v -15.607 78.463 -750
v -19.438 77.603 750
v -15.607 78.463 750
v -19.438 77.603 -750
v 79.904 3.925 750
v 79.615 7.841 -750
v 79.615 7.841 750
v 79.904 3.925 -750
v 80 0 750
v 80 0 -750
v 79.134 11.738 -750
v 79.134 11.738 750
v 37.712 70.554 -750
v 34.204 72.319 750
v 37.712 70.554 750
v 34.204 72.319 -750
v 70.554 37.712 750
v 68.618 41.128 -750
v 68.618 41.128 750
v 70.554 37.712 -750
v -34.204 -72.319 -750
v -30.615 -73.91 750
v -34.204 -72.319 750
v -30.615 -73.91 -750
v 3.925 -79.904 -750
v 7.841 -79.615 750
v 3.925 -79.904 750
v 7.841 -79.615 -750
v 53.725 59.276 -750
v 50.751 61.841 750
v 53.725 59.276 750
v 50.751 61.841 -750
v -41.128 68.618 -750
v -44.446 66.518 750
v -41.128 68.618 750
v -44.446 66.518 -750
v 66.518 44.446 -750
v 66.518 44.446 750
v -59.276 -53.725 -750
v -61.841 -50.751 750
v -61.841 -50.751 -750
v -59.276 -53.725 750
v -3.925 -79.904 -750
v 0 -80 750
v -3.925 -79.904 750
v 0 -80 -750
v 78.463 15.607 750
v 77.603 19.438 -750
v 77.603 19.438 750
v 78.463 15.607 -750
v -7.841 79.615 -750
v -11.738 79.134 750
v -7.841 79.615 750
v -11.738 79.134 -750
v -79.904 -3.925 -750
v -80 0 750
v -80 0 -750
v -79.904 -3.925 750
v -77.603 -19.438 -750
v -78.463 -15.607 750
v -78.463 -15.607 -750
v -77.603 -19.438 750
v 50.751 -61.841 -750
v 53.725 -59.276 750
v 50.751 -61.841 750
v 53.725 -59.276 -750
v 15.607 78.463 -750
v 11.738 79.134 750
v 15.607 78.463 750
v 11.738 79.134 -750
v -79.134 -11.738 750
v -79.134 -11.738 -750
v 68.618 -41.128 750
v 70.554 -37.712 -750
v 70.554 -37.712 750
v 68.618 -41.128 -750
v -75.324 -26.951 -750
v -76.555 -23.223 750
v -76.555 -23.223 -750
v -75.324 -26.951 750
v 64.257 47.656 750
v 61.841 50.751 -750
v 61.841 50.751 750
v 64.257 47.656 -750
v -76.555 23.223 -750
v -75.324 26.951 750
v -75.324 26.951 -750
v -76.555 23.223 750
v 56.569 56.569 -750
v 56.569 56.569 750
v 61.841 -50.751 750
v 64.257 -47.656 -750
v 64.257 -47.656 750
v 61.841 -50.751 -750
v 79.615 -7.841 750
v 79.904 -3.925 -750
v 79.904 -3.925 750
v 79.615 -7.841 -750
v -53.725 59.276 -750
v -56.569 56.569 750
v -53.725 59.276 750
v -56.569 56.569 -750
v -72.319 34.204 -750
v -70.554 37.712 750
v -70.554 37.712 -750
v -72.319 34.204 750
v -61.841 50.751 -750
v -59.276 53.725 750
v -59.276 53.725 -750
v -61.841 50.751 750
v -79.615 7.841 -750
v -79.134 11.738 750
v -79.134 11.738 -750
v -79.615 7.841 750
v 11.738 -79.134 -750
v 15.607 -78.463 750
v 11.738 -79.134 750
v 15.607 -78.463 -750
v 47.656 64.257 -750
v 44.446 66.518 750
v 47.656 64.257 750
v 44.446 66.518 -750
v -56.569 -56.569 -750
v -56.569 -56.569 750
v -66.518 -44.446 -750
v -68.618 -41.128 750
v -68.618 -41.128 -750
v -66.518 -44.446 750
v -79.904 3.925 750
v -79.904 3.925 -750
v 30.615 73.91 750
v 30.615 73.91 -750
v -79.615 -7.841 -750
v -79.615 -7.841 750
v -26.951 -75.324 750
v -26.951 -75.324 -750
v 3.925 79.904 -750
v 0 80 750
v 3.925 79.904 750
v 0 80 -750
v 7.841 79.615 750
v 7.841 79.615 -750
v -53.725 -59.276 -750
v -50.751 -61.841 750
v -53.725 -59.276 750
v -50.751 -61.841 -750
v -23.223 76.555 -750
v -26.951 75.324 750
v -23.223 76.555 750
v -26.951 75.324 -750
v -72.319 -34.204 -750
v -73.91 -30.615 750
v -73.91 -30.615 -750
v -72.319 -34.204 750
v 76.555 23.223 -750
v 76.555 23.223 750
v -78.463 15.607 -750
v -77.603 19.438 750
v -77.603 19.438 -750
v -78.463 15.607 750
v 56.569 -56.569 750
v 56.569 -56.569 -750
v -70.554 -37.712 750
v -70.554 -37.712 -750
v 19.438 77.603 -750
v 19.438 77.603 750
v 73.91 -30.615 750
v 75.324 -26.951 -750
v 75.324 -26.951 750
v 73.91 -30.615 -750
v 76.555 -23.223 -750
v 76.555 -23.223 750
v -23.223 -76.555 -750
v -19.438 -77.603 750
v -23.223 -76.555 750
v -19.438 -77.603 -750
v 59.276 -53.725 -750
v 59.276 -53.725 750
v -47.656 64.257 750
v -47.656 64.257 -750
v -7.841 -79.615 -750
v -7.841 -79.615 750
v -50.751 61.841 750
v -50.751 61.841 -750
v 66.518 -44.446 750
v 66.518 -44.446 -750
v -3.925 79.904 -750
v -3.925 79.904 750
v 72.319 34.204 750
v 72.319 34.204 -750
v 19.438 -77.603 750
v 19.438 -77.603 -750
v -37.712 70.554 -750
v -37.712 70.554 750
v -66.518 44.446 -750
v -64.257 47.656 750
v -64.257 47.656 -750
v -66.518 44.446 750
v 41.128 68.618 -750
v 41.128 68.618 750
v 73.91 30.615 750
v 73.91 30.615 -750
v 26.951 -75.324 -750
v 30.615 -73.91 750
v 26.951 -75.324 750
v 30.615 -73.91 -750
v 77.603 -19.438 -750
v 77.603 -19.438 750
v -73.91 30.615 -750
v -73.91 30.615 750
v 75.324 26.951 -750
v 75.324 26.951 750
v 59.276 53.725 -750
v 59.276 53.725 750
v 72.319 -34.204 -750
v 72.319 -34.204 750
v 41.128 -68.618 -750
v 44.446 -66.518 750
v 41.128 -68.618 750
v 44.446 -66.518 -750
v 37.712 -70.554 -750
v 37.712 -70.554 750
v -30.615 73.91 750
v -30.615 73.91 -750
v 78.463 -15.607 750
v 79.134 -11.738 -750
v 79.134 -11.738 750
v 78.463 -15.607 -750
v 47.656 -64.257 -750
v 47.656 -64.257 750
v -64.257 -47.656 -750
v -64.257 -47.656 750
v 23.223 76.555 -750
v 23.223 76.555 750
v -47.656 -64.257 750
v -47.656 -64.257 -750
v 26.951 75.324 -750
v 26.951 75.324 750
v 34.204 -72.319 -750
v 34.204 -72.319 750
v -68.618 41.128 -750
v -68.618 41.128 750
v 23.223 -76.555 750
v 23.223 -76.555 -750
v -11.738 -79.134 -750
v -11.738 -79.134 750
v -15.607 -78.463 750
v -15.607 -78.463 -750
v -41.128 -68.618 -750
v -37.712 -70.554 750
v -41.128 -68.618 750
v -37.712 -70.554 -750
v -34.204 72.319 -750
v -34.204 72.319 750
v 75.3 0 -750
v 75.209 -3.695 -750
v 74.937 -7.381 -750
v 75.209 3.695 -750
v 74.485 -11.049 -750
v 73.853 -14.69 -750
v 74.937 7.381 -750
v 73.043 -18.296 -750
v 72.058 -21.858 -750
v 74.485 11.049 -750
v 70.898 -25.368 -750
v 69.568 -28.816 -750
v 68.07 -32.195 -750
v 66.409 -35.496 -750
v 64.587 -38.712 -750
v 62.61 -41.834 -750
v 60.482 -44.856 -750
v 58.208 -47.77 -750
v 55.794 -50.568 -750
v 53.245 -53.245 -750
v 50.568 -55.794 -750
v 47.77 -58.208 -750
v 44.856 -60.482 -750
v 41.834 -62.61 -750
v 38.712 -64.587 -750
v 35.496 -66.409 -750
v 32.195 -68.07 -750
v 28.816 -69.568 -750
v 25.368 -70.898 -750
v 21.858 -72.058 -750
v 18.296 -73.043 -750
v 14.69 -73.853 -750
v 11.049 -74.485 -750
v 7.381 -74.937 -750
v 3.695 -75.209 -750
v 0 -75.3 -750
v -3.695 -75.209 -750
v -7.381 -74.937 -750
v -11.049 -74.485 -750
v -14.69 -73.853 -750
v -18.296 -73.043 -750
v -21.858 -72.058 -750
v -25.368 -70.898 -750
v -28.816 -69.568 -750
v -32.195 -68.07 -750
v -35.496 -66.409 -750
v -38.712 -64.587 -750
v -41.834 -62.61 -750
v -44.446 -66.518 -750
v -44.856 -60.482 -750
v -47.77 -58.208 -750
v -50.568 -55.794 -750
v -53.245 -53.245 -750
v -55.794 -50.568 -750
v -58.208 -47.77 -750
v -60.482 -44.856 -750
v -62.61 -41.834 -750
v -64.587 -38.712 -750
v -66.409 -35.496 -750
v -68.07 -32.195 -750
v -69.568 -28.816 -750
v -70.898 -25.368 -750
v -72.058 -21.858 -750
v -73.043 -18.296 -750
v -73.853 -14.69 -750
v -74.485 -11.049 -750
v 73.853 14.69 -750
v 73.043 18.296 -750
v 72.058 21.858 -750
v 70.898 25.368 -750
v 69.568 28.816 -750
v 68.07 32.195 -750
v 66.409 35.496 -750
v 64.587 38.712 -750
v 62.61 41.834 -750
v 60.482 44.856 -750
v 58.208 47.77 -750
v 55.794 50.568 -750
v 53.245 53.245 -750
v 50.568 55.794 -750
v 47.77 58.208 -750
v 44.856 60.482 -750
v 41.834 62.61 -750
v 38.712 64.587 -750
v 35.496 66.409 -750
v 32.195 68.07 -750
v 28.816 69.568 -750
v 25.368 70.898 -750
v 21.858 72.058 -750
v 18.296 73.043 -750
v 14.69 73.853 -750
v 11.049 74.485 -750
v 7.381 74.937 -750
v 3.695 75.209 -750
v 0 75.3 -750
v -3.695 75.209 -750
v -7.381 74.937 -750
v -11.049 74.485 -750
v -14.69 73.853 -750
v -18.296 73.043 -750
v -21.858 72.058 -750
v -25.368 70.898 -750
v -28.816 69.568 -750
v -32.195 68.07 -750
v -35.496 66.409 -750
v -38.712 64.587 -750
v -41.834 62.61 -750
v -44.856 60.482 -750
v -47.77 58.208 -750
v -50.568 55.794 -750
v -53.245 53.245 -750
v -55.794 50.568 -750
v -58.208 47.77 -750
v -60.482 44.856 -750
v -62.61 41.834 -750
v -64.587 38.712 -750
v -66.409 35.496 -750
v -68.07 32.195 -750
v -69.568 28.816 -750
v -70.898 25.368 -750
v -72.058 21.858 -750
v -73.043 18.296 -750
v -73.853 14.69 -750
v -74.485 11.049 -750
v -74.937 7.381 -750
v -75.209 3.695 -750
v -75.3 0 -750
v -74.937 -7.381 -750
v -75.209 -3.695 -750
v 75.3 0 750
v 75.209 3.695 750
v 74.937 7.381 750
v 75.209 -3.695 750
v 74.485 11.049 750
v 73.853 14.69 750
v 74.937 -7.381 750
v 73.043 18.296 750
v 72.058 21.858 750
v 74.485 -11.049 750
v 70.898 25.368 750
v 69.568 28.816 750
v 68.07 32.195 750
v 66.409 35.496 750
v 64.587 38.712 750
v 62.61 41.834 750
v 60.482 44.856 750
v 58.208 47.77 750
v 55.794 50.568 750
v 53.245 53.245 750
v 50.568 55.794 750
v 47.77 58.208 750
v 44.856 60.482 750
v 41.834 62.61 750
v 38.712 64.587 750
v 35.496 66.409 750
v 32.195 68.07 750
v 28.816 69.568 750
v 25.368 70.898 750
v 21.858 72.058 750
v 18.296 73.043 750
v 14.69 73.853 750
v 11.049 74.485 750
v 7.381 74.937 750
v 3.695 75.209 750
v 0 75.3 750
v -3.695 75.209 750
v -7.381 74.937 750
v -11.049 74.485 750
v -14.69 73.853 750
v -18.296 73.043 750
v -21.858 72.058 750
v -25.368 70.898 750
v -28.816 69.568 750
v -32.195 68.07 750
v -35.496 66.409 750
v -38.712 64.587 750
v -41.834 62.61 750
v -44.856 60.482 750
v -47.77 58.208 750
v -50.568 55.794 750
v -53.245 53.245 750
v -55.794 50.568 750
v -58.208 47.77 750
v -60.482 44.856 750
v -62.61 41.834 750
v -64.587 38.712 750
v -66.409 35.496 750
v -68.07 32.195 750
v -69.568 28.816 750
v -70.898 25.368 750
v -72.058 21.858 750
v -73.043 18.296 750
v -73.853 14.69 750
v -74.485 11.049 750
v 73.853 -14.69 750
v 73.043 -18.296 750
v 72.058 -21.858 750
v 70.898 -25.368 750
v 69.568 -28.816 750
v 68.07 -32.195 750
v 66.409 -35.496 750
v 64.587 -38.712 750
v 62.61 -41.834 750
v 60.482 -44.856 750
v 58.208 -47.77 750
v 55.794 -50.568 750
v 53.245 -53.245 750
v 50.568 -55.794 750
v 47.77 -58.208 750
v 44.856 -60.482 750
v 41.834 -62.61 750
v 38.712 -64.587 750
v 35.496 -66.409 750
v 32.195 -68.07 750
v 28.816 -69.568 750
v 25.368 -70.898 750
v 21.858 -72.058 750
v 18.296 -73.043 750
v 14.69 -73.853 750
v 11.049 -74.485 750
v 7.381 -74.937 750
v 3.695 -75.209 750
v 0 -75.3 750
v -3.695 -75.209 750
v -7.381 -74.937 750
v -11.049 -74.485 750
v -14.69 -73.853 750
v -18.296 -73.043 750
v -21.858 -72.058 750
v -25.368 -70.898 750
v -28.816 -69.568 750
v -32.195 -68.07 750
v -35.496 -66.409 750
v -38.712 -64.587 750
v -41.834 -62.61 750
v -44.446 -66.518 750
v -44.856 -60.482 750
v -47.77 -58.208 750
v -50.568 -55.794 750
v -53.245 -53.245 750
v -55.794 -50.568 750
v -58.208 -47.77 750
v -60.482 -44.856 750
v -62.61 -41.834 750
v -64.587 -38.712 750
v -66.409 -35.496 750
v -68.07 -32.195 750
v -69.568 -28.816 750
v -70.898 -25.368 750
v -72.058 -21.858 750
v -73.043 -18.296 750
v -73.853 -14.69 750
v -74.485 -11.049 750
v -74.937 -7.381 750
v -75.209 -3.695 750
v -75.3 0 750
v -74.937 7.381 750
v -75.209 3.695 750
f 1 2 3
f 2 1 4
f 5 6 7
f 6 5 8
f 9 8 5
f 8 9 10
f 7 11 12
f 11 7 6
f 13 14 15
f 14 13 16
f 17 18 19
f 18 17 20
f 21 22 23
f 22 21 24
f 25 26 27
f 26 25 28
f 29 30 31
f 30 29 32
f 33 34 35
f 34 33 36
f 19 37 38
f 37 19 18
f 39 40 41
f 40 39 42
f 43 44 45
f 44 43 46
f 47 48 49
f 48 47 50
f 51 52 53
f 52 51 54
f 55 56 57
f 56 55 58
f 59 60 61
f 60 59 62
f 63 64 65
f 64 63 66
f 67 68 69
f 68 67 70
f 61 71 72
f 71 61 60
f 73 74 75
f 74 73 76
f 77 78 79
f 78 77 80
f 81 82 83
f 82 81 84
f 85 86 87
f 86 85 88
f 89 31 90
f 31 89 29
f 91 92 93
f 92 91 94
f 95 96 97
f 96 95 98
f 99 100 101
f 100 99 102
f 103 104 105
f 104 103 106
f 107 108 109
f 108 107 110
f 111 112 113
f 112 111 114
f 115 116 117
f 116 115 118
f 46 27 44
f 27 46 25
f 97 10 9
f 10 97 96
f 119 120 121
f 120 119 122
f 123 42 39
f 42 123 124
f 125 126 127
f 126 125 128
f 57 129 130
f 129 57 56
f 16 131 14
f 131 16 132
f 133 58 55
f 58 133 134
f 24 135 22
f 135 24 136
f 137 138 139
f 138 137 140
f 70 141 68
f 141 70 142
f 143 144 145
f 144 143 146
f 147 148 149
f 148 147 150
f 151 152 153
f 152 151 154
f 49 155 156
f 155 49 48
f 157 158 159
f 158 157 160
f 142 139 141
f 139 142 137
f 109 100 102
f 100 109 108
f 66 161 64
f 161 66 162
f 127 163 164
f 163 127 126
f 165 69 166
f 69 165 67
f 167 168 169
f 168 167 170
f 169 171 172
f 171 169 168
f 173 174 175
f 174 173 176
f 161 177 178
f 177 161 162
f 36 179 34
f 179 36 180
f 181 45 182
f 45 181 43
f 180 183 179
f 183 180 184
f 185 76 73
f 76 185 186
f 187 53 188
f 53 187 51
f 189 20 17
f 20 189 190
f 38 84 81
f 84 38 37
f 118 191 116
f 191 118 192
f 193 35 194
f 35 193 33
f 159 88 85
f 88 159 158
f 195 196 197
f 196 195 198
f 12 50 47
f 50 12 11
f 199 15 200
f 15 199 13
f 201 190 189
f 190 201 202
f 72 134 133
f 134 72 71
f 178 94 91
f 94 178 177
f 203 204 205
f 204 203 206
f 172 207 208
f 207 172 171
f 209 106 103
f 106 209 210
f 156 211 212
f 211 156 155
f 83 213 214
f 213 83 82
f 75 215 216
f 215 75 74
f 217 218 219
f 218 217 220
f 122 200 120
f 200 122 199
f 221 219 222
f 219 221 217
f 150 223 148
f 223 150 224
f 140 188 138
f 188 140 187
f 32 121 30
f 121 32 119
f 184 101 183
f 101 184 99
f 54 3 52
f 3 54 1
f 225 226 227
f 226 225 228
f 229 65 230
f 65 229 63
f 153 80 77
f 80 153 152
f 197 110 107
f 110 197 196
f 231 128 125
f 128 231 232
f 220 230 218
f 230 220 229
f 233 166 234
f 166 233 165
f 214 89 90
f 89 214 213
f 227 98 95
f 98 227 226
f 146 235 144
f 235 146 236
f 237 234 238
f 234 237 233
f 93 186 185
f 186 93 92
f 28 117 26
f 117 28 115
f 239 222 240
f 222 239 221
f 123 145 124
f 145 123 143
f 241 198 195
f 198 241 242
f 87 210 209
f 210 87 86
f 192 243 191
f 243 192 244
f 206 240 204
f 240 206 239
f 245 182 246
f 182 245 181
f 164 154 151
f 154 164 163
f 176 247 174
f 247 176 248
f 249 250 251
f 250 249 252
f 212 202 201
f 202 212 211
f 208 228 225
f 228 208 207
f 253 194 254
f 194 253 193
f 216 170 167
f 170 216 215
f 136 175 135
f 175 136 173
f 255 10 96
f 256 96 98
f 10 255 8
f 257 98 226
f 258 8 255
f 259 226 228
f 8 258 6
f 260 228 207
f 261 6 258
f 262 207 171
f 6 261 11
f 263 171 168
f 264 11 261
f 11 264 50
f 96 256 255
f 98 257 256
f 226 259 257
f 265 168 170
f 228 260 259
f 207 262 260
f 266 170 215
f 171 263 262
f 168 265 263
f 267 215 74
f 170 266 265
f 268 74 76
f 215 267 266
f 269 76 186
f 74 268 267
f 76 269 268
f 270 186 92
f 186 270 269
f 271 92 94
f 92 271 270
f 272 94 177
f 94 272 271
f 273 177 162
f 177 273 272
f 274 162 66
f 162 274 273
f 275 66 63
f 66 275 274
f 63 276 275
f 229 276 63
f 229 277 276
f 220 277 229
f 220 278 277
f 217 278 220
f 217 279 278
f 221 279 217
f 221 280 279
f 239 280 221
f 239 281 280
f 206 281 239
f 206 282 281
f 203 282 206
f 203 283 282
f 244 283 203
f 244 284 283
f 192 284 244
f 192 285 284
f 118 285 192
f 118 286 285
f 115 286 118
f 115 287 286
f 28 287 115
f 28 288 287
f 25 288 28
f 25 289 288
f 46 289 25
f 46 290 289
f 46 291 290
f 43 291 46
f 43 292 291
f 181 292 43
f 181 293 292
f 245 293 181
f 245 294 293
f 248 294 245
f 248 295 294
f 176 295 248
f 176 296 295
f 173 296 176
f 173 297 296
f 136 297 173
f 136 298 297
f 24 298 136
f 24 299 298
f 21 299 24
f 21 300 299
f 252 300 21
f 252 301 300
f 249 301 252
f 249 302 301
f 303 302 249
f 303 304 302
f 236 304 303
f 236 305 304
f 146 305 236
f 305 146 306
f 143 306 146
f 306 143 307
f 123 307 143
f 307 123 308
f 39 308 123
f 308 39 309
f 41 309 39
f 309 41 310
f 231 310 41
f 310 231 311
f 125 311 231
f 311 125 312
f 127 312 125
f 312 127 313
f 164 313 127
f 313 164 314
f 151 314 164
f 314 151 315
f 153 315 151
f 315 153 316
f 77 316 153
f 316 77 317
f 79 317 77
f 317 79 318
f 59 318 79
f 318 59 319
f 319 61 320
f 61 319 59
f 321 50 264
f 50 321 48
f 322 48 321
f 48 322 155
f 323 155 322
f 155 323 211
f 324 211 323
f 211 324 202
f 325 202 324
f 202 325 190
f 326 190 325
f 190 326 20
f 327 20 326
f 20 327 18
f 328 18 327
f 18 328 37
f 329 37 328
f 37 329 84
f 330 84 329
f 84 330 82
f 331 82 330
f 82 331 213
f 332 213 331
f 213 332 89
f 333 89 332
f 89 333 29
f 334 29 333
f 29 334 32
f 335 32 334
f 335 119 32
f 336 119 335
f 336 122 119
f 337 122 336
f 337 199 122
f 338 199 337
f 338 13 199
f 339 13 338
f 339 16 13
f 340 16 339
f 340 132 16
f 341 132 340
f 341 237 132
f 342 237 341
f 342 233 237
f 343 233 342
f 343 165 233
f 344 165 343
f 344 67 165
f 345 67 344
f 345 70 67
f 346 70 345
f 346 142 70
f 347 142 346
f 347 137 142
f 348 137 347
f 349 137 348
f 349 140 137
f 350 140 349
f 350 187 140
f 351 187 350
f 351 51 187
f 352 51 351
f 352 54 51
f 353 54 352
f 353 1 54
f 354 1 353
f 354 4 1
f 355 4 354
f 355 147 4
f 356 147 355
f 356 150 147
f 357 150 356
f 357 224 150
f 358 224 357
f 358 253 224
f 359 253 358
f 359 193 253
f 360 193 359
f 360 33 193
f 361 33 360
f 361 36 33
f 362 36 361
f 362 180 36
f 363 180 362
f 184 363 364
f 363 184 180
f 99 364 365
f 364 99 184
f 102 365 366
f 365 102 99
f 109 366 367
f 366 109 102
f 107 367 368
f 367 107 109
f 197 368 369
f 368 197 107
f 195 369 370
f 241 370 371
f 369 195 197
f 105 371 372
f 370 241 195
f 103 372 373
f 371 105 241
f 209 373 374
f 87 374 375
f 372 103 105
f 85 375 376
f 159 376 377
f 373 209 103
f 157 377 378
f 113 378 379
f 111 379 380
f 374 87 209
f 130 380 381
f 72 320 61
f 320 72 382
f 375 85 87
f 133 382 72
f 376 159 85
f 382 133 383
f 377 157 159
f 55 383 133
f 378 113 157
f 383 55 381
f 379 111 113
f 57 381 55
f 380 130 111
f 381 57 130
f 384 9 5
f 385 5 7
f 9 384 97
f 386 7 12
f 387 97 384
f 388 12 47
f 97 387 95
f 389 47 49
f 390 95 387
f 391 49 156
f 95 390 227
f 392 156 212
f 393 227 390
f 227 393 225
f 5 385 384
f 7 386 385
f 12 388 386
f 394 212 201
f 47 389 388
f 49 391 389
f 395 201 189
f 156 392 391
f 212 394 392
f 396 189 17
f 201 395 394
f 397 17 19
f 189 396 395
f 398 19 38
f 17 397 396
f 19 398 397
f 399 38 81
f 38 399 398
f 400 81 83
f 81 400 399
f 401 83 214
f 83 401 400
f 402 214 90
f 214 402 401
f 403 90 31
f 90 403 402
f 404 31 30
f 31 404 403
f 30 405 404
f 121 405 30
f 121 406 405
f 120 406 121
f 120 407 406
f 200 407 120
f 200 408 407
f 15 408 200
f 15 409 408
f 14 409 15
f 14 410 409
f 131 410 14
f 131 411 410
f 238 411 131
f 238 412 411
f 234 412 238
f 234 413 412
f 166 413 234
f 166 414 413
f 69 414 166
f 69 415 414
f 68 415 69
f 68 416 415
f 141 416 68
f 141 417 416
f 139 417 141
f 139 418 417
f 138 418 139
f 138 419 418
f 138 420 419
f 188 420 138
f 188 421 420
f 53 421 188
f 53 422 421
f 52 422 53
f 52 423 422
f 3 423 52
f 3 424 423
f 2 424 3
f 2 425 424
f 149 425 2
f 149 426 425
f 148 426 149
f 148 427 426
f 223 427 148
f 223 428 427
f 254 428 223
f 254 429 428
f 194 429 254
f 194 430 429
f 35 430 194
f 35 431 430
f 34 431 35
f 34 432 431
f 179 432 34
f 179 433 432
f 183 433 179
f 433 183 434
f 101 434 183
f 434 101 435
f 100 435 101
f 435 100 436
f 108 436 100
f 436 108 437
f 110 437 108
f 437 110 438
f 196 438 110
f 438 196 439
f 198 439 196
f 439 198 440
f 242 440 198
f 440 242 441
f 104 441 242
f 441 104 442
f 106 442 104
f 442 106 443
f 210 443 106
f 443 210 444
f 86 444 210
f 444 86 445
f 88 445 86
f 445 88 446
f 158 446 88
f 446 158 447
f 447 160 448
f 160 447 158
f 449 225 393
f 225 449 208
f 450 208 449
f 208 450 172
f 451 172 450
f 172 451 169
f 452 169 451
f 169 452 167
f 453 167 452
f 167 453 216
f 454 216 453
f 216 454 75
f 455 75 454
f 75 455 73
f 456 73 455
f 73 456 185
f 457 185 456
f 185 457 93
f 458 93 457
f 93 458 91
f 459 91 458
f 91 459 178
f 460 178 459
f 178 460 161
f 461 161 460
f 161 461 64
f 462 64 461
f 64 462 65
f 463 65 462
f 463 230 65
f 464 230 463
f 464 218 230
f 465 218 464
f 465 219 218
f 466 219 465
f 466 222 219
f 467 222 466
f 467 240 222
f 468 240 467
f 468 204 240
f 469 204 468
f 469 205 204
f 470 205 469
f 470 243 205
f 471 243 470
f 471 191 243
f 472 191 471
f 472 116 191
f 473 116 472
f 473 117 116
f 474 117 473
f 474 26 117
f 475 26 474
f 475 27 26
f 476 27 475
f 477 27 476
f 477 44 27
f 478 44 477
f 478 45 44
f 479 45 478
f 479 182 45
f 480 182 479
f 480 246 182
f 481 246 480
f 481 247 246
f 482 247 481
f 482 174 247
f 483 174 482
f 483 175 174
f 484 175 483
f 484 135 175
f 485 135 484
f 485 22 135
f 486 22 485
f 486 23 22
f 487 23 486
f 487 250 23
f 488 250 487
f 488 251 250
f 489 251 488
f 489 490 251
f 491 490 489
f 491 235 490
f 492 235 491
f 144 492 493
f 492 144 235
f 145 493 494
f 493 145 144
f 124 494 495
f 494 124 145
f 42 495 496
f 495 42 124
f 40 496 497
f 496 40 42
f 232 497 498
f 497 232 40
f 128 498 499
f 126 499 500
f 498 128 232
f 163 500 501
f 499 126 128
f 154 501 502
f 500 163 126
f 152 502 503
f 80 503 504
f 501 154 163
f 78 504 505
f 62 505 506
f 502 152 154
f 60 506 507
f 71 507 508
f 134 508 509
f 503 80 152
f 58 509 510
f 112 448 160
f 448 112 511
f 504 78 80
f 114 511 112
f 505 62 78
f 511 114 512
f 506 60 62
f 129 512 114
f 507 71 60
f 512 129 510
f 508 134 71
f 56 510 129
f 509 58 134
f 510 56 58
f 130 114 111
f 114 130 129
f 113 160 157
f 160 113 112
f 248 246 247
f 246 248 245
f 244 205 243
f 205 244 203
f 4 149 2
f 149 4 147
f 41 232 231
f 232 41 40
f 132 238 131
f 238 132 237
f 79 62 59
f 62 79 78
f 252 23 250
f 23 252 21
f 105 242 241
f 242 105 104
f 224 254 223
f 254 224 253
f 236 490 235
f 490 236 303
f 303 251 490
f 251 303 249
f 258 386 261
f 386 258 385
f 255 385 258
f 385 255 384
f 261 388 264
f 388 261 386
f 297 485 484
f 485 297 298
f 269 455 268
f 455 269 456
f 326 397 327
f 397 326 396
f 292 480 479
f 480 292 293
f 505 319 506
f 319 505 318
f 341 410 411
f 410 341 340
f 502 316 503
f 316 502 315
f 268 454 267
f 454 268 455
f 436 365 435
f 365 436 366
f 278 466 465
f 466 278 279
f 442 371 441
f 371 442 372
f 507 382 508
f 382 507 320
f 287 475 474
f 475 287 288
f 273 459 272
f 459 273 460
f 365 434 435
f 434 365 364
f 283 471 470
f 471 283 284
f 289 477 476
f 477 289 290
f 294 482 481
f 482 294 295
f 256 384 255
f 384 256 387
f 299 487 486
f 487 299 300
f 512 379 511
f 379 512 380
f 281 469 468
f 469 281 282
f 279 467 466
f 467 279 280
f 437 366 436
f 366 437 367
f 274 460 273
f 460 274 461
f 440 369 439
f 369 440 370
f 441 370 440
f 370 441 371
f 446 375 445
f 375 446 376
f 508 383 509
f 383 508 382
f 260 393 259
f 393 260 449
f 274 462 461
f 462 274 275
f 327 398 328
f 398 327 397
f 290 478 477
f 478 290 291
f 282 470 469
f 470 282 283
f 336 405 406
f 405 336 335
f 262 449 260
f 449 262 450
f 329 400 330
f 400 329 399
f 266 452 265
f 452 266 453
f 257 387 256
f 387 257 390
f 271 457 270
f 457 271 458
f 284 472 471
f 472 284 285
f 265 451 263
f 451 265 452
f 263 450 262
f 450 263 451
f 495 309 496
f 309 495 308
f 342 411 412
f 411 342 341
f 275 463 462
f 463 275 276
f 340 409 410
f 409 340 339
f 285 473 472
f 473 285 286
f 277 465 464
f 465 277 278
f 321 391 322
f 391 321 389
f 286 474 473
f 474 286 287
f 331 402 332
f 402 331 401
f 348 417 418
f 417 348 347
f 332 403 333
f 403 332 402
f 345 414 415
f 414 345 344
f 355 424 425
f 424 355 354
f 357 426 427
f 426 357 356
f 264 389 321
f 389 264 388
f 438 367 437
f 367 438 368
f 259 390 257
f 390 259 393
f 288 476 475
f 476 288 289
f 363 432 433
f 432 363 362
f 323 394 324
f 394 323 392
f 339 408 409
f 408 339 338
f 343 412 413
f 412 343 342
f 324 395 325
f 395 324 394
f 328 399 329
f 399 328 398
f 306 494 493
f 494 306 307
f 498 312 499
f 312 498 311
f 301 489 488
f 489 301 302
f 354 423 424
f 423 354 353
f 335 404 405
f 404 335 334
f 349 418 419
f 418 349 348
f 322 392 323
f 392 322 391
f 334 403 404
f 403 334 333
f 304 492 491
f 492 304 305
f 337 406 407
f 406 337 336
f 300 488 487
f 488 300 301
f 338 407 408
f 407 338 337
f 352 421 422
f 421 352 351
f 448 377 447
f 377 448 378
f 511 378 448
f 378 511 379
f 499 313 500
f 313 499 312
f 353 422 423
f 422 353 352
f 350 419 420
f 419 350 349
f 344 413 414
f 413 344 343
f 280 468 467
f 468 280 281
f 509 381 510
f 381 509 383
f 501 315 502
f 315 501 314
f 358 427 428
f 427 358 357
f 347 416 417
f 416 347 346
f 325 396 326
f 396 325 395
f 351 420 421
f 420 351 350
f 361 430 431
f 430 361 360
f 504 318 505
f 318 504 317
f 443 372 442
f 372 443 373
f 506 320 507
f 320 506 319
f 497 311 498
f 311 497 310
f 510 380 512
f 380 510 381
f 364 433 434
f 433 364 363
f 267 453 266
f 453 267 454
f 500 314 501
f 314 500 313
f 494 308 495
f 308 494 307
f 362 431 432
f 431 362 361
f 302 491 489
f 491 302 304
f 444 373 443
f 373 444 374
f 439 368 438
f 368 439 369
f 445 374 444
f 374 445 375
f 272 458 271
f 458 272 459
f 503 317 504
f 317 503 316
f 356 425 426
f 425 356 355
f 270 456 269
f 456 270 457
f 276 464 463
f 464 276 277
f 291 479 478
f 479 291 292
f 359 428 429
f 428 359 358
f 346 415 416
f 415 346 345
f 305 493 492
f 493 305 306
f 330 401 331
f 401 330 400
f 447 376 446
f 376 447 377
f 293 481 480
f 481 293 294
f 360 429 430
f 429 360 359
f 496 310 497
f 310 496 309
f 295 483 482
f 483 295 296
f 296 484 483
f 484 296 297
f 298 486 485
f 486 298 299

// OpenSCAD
$fn=128;

module ht_pipe(od=160, length=1500, wall=4.7) {
    difference() {
        cylinder(h=length, d=od, center=true);
        cylinder(h=length+2, d=od-2*wall, center=true);
    }
}

ht_pipe(od=160, length=1500, wall=4.7);
